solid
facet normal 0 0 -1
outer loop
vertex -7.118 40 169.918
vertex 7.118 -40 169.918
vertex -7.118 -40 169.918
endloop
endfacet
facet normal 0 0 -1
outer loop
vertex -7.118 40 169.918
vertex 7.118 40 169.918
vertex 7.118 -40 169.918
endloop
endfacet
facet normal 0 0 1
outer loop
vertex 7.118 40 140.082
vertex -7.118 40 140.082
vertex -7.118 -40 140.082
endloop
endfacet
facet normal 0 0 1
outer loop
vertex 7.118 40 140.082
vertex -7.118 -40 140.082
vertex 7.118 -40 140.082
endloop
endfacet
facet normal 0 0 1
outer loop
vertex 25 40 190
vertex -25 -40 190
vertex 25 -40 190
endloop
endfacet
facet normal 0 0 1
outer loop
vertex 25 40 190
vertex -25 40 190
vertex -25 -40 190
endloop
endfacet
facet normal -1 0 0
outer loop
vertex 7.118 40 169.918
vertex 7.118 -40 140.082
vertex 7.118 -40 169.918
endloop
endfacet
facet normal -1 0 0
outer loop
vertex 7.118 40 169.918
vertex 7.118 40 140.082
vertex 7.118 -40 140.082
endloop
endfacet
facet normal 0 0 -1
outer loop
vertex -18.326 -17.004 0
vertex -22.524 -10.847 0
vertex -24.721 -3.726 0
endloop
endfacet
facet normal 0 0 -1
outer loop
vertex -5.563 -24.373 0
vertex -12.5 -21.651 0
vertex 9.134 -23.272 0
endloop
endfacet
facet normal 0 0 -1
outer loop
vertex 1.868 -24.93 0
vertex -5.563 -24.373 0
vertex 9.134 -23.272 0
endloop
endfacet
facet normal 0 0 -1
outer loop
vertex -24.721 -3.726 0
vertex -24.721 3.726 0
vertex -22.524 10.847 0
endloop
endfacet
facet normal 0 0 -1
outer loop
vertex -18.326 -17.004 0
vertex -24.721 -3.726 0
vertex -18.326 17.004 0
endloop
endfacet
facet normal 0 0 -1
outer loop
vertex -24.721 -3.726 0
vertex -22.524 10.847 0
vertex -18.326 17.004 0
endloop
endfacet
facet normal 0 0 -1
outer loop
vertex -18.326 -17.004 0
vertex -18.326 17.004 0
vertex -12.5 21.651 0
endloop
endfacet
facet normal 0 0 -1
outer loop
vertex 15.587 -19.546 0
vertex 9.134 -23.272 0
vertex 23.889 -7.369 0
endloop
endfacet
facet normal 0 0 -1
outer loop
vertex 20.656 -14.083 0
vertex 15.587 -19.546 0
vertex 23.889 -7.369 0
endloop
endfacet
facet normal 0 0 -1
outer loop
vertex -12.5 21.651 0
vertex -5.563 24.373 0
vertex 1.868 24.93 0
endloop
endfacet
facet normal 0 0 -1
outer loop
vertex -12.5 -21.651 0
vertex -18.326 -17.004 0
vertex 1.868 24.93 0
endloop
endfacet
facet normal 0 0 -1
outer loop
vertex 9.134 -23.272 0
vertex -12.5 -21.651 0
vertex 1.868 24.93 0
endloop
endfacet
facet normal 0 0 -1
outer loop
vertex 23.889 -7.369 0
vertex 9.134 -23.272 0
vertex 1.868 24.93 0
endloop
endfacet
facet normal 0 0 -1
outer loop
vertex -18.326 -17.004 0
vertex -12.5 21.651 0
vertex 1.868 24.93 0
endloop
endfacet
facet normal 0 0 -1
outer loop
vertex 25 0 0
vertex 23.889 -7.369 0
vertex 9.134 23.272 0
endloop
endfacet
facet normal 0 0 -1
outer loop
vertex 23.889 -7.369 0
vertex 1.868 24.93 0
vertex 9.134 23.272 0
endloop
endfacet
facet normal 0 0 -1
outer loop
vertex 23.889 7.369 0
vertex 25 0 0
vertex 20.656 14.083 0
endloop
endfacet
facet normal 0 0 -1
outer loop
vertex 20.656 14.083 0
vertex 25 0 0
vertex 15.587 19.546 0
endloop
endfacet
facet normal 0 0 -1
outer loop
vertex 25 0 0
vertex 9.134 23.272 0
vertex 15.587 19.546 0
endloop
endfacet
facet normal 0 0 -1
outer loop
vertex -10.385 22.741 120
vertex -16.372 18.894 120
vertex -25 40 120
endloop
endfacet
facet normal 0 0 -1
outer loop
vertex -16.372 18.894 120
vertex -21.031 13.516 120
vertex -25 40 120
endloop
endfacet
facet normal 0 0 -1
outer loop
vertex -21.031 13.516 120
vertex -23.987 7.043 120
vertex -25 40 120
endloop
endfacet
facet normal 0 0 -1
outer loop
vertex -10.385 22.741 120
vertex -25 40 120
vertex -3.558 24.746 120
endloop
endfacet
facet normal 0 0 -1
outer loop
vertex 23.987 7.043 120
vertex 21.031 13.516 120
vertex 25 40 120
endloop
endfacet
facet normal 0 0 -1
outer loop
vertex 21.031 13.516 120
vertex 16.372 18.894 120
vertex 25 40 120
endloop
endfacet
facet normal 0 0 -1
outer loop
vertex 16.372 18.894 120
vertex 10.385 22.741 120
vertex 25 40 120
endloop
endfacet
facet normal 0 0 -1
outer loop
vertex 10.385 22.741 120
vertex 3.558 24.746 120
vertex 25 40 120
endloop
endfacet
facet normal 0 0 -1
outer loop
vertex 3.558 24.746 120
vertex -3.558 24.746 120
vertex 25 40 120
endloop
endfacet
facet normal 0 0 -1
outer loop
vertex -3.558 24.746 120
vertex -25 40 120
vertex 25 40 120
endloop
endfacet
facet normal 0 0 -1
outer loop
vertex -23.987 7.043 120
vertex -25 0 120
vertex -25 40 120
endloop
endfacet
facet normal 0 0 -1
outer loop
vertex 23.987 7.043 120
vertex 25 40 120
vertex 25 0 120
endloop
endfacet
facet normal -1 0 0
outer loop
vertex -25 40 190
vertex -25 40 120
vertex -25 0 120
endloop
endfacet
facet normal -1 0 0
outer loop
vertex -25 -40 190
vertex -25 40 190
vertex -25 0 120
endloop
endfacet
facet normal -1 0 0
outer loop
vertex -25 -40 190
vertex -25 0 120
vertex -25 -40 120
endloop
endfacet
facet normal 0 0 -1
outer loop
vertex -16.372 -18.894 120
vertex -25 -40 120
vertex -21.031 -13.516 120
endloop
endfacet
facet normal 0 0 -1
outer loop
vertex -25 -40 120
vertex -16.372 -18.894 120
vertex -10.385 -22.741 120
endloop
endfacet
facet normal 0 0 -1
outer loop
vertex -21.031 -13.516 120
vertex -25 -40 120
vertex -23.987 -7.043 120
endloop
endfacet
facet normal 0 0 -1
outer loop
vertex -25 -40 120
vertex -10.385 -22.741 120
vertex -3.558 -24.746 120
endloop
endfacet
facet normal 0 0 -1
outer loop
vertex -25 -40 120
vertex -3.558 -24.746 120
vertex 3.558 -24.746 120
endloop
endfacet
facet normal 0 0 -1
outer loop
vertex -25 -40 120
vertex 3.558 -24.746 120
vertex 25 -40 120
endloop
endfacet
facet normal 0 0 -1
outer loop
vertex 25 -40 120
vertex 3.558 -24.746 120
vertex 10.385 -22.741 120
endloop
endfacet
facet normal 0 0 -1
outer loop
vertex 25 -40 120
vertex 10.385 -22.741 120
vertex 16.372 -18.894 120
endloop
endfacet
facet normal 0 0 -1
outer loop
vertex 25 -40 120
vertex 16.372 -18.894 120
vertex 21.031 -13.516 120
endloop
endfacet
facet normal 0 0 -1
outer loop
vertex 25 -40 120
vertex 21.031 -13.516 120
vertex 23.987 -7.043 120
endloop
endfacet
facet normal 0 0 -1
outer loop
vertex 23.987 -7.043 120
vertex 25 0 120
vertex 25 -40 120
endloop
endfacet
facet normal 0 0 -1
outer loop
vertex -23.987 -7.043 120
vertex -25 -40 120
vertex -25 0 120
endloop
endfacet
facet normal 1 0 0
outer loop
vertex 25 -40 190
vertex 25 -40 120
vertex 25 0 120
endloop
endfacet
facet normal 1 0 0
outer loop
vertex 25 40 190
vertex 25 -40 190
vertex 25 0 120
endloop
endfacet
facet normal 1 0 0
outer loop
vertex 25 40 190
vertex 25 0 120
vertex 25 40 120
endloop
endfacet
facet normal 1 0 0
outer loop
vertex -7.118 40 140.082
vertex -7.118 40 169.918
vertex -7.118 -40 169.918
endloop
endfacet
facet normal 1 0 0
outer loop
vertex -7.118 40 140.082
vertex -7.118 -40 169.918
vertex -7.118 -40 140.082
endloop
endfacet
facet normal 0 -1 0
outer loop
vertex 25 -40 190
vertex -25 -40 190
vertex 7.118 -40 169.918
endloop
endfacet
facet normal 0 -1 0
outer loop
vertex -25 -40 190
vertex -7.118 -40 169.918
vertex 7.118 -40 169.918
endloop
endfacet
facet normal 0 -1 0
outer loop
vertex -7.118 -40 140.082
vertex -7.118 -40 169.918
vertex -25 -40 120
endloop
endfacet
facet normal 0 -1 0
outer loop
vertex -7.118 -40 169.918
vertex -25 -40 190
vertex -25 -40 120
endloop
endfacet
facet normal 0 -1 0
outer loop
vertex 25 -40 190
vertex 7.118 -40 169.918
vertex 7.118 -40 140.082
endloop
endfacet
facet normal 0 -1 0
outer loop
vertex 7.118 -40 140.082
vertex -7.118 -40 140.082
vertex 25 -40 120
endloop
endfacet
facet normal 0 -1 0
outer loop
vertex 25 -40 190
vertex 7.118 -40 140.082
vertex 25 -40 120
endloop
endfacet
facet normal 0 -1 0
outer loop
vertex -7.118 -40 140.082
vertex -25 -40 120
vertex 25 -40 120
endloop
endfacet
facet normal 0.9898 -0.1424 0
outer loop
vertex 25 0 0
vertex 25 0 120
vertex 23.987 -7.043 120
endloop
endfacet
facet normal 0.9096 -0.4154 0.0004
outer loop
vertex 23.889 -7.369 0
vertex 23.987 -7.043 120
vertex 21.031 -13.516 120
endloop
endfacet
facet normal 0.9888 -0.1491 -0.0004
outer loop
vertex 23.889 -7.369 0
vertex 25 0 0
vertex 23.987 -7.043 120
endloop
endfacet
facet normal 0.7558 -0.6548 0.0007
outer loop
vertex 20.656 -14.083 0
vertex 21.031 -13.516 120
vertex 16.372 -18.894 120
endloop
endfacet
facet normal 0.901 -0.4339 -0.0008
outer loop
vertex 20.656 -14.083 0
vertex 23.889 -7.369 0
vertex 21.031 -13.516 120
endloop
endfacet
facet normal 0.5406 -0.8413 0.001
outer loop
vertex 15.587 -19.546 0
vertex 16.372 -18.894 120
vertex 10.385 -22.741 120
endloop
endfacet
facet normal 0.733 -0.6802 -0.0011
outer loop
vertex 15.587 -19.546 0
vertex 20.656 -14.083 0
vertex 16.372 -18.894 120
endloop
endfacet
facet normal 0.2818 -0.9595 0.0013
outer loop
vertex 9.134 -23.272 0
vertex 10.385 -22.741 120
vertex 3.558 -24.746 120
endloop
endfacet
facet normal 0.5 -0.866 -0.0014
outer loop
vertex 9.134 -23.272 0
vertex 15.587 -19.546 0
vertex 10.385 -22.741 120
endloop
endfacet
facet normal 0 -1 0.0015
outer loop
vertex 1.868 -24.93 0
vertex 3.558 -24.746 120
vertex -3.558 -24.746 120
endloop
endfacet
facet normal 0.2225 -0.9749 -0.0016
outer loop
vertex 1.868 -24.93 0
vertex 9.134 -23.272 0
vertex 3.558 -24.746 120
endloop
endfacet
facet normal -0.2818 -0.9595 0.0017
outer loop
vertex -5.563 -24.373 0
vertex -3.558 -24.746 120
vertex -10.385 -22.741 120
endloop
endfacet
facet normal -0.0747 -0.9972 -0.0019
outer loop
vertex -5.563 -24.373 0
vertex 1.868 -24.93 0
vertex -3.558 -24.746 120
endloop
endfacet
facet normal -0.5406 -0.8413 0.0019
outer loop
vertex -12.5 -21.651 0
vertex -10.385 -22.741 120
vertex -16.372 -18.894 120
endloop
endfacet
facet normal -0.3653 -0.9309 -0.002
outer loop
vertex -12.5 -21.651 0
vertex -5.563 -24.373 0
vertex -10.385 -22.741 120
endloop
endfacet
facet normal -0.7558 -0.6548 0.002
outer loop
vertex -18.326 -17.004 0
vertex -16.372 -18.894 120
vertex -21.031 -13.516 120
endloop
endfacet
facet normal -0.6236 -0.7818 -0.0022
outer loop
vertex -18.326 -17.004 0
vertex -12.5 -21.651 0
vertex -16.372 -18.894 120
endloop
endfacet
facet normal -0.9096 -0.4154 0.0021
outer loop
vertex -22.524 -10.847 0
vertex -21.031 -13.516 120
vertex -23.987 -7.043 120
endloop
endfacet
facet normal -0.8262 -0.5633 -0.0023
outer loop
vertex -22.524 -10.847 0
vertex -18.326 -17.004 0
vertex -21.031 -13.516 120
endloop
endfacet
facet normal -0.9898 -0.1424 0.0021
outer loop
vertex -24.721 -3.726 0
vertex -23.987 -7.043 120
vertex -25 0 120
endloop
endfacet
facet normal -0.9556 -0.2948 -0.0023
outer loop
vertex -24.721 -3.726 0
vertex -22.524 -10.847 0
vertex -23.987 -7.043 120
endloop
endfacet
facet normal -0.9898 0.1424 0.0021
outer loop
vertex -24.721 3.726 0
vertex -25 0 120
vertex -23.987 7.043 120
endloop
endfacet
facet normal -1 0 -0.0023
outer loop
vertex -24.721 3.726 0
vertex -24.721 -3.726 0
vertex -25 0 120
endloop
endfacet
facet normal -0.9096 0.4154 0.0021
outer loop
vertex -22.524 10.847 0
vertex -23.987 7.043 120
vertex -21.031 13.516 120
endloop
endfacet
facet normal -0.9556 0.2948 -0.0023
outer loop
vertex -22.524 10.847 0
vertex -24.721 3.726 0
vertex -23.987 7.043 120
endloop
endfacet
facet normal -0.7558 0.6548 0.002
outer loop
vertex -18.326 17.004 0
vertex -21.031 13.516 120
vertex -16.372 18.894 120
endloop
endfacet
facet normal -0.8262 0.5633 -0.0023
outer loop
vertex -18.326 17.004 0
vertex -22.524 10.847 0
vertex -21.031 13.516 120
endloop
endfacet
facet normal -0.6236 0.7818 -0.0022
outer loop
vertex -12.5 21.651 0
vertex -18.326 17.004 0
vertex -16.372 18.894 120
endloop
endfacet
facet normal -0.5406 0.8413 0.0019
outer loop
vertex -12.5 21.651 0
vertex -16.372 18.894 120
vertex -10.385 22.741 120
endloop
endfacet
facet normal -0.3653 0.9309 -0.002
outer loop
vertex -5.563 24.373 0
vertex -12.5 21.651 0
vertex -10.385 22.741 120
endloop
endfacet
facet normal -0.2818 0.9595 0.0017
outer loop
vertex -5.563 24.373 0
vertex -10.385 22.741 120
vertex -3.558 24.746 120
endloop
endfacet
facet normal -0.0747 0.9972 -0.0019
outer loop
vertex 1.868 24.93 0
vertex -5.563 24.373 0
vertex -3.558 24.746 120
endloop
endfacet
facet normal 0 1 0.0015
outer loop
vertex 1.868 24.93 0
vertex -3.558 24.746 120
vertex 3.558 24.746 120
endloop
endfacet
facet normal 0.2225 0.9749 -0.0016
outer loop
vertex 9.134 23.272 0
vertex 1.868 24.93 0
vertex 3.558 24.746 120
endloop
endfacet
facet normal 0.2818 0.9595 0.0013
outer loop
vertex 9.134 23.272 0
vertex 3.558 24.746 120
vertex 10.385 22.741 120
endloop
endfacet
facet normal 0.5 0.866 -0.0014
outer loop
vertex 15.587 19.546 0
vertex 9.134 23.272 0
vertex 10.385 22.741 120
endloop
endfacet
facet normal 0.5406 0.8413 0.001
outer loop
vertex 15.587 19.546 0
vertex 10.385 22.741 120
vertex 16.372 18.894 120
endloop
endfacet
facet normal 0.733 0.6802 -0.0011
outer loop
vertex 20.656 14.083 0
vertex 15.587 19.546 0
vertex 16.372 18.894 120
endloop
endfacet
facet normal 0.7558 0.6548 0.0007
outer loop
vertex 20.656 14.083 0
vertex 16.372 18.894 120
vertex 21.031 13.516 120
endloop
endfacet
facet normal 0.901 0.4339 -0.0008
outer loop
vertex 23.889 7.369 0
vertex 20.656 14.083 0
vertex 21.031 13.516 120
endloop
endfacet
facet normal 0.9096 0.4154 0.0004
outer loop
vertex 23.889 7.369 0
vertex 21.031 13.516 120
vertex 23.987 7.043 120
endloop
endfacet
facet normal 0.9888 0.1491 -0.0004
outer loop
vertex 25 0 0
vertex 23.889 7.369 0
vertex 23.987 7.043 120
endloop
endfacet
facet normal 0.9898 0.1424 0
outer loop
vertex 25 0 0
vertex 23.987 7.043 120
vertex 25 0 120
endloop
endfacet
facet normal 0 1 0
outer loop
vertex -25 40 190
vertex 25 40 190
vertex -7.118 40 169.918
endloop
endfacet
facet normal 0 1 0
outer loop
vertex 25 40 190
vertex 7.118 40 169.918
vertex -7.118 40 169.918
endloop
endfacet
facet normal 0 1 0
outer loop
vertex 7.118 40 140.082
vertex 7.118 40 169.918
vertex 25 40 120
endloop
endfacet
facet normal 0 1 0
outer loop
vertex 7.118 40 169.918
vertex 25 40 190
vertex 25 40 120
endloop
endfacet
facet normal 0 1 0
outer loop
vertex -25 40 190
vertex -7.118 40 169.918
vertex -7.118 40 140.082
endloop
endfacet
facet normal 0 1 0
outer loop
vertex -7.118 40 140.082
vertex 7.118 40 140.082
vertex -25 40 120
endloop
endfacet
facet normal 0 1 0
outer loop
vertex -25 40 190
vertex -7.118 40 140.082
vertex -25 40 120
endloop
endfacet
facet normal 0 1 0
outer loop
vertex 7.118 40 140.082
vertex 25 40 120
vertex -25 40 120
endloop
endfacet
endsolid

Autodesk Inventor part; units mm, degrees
ref_plane "YZ Plane" through (0, 0, 0) normal (1, 0, 0) x (0, 1, 0)
ref_plane "XZ Plane" through (0, 0, 0) normal (0, 1, 0) x (-1, 0, 0)
ref_plane "XY Plane" through (0, 0, 0) normal (0, 0, 1) x (1, 0, 0)
sketch "Sketch1" plane through (0, 0, 0) normal (0, 0, 1) x (1, 0, 0)
  circle A0 centre (0, 0) radius 25
  dimension "d0" = 50
extrude "Extrusion1" add sketch "Sketch1" along normal blind 120
sketch "Sketch5" plane through (0, 0, 120) normal (0, 0, 1) x (1, 0, 0)
  line L0 (-25, -40) -> (25, -40)
  line L1 (25, -40) -> (25, 40)
  line L2 (25, 40) -> (-25, 40)
  line L3 (-25, 40) -> (-25, -40)
  line L4 (-25, -40) -> (25, 40) construction
  line L5 (25, -40) -> (-25, 40) construction
  point P0 (0, 0)
  dimension "d18" = 50
  dimension "d19" = 80
extrude "Extrusion4" add sketch "Sketch5" along normal blind 70
sketch "Sketch6" plane through (-25, 40, 120) normal (0, 1, 0) x (1, 0, 0)
  point P0 (25, 120)
sketch "Sketch7" plane through (-25, 40, 120) normal (0, 1, 0) x (1, 0, 0)
  line L0 (0, 0) -> (50, 0) projected
  line L1 (0, -70) -> (50, -70) projected
  line L2 (50, 0) -> (0, -70)
  line L3 (32.1175, -49.918) -> (17.8825, -49.918)
  line L4 (17.8825, -49.918) -> (17.8825, -20.082)
  line L5 (17.8825, -20.082) -> (32.1175, -20.082)
  line L6 (32.1175, -20.082) -> (32.1175, -49.918)
  line L7 (32.1175, -49.918) -> (17.8825, -20.082) construction
  line L8 (17.8825, -49.918) -> (32.1175, -20.082) construction
  point P0 (25, 120)
  point P1 (25, -35)
  dimension "d22" = 14.235
  dimension "d23" = 29.836
extrude "Extrusion5" cut sketch "Sketch7" against normal through all
properties part number "武士刀夾具"
